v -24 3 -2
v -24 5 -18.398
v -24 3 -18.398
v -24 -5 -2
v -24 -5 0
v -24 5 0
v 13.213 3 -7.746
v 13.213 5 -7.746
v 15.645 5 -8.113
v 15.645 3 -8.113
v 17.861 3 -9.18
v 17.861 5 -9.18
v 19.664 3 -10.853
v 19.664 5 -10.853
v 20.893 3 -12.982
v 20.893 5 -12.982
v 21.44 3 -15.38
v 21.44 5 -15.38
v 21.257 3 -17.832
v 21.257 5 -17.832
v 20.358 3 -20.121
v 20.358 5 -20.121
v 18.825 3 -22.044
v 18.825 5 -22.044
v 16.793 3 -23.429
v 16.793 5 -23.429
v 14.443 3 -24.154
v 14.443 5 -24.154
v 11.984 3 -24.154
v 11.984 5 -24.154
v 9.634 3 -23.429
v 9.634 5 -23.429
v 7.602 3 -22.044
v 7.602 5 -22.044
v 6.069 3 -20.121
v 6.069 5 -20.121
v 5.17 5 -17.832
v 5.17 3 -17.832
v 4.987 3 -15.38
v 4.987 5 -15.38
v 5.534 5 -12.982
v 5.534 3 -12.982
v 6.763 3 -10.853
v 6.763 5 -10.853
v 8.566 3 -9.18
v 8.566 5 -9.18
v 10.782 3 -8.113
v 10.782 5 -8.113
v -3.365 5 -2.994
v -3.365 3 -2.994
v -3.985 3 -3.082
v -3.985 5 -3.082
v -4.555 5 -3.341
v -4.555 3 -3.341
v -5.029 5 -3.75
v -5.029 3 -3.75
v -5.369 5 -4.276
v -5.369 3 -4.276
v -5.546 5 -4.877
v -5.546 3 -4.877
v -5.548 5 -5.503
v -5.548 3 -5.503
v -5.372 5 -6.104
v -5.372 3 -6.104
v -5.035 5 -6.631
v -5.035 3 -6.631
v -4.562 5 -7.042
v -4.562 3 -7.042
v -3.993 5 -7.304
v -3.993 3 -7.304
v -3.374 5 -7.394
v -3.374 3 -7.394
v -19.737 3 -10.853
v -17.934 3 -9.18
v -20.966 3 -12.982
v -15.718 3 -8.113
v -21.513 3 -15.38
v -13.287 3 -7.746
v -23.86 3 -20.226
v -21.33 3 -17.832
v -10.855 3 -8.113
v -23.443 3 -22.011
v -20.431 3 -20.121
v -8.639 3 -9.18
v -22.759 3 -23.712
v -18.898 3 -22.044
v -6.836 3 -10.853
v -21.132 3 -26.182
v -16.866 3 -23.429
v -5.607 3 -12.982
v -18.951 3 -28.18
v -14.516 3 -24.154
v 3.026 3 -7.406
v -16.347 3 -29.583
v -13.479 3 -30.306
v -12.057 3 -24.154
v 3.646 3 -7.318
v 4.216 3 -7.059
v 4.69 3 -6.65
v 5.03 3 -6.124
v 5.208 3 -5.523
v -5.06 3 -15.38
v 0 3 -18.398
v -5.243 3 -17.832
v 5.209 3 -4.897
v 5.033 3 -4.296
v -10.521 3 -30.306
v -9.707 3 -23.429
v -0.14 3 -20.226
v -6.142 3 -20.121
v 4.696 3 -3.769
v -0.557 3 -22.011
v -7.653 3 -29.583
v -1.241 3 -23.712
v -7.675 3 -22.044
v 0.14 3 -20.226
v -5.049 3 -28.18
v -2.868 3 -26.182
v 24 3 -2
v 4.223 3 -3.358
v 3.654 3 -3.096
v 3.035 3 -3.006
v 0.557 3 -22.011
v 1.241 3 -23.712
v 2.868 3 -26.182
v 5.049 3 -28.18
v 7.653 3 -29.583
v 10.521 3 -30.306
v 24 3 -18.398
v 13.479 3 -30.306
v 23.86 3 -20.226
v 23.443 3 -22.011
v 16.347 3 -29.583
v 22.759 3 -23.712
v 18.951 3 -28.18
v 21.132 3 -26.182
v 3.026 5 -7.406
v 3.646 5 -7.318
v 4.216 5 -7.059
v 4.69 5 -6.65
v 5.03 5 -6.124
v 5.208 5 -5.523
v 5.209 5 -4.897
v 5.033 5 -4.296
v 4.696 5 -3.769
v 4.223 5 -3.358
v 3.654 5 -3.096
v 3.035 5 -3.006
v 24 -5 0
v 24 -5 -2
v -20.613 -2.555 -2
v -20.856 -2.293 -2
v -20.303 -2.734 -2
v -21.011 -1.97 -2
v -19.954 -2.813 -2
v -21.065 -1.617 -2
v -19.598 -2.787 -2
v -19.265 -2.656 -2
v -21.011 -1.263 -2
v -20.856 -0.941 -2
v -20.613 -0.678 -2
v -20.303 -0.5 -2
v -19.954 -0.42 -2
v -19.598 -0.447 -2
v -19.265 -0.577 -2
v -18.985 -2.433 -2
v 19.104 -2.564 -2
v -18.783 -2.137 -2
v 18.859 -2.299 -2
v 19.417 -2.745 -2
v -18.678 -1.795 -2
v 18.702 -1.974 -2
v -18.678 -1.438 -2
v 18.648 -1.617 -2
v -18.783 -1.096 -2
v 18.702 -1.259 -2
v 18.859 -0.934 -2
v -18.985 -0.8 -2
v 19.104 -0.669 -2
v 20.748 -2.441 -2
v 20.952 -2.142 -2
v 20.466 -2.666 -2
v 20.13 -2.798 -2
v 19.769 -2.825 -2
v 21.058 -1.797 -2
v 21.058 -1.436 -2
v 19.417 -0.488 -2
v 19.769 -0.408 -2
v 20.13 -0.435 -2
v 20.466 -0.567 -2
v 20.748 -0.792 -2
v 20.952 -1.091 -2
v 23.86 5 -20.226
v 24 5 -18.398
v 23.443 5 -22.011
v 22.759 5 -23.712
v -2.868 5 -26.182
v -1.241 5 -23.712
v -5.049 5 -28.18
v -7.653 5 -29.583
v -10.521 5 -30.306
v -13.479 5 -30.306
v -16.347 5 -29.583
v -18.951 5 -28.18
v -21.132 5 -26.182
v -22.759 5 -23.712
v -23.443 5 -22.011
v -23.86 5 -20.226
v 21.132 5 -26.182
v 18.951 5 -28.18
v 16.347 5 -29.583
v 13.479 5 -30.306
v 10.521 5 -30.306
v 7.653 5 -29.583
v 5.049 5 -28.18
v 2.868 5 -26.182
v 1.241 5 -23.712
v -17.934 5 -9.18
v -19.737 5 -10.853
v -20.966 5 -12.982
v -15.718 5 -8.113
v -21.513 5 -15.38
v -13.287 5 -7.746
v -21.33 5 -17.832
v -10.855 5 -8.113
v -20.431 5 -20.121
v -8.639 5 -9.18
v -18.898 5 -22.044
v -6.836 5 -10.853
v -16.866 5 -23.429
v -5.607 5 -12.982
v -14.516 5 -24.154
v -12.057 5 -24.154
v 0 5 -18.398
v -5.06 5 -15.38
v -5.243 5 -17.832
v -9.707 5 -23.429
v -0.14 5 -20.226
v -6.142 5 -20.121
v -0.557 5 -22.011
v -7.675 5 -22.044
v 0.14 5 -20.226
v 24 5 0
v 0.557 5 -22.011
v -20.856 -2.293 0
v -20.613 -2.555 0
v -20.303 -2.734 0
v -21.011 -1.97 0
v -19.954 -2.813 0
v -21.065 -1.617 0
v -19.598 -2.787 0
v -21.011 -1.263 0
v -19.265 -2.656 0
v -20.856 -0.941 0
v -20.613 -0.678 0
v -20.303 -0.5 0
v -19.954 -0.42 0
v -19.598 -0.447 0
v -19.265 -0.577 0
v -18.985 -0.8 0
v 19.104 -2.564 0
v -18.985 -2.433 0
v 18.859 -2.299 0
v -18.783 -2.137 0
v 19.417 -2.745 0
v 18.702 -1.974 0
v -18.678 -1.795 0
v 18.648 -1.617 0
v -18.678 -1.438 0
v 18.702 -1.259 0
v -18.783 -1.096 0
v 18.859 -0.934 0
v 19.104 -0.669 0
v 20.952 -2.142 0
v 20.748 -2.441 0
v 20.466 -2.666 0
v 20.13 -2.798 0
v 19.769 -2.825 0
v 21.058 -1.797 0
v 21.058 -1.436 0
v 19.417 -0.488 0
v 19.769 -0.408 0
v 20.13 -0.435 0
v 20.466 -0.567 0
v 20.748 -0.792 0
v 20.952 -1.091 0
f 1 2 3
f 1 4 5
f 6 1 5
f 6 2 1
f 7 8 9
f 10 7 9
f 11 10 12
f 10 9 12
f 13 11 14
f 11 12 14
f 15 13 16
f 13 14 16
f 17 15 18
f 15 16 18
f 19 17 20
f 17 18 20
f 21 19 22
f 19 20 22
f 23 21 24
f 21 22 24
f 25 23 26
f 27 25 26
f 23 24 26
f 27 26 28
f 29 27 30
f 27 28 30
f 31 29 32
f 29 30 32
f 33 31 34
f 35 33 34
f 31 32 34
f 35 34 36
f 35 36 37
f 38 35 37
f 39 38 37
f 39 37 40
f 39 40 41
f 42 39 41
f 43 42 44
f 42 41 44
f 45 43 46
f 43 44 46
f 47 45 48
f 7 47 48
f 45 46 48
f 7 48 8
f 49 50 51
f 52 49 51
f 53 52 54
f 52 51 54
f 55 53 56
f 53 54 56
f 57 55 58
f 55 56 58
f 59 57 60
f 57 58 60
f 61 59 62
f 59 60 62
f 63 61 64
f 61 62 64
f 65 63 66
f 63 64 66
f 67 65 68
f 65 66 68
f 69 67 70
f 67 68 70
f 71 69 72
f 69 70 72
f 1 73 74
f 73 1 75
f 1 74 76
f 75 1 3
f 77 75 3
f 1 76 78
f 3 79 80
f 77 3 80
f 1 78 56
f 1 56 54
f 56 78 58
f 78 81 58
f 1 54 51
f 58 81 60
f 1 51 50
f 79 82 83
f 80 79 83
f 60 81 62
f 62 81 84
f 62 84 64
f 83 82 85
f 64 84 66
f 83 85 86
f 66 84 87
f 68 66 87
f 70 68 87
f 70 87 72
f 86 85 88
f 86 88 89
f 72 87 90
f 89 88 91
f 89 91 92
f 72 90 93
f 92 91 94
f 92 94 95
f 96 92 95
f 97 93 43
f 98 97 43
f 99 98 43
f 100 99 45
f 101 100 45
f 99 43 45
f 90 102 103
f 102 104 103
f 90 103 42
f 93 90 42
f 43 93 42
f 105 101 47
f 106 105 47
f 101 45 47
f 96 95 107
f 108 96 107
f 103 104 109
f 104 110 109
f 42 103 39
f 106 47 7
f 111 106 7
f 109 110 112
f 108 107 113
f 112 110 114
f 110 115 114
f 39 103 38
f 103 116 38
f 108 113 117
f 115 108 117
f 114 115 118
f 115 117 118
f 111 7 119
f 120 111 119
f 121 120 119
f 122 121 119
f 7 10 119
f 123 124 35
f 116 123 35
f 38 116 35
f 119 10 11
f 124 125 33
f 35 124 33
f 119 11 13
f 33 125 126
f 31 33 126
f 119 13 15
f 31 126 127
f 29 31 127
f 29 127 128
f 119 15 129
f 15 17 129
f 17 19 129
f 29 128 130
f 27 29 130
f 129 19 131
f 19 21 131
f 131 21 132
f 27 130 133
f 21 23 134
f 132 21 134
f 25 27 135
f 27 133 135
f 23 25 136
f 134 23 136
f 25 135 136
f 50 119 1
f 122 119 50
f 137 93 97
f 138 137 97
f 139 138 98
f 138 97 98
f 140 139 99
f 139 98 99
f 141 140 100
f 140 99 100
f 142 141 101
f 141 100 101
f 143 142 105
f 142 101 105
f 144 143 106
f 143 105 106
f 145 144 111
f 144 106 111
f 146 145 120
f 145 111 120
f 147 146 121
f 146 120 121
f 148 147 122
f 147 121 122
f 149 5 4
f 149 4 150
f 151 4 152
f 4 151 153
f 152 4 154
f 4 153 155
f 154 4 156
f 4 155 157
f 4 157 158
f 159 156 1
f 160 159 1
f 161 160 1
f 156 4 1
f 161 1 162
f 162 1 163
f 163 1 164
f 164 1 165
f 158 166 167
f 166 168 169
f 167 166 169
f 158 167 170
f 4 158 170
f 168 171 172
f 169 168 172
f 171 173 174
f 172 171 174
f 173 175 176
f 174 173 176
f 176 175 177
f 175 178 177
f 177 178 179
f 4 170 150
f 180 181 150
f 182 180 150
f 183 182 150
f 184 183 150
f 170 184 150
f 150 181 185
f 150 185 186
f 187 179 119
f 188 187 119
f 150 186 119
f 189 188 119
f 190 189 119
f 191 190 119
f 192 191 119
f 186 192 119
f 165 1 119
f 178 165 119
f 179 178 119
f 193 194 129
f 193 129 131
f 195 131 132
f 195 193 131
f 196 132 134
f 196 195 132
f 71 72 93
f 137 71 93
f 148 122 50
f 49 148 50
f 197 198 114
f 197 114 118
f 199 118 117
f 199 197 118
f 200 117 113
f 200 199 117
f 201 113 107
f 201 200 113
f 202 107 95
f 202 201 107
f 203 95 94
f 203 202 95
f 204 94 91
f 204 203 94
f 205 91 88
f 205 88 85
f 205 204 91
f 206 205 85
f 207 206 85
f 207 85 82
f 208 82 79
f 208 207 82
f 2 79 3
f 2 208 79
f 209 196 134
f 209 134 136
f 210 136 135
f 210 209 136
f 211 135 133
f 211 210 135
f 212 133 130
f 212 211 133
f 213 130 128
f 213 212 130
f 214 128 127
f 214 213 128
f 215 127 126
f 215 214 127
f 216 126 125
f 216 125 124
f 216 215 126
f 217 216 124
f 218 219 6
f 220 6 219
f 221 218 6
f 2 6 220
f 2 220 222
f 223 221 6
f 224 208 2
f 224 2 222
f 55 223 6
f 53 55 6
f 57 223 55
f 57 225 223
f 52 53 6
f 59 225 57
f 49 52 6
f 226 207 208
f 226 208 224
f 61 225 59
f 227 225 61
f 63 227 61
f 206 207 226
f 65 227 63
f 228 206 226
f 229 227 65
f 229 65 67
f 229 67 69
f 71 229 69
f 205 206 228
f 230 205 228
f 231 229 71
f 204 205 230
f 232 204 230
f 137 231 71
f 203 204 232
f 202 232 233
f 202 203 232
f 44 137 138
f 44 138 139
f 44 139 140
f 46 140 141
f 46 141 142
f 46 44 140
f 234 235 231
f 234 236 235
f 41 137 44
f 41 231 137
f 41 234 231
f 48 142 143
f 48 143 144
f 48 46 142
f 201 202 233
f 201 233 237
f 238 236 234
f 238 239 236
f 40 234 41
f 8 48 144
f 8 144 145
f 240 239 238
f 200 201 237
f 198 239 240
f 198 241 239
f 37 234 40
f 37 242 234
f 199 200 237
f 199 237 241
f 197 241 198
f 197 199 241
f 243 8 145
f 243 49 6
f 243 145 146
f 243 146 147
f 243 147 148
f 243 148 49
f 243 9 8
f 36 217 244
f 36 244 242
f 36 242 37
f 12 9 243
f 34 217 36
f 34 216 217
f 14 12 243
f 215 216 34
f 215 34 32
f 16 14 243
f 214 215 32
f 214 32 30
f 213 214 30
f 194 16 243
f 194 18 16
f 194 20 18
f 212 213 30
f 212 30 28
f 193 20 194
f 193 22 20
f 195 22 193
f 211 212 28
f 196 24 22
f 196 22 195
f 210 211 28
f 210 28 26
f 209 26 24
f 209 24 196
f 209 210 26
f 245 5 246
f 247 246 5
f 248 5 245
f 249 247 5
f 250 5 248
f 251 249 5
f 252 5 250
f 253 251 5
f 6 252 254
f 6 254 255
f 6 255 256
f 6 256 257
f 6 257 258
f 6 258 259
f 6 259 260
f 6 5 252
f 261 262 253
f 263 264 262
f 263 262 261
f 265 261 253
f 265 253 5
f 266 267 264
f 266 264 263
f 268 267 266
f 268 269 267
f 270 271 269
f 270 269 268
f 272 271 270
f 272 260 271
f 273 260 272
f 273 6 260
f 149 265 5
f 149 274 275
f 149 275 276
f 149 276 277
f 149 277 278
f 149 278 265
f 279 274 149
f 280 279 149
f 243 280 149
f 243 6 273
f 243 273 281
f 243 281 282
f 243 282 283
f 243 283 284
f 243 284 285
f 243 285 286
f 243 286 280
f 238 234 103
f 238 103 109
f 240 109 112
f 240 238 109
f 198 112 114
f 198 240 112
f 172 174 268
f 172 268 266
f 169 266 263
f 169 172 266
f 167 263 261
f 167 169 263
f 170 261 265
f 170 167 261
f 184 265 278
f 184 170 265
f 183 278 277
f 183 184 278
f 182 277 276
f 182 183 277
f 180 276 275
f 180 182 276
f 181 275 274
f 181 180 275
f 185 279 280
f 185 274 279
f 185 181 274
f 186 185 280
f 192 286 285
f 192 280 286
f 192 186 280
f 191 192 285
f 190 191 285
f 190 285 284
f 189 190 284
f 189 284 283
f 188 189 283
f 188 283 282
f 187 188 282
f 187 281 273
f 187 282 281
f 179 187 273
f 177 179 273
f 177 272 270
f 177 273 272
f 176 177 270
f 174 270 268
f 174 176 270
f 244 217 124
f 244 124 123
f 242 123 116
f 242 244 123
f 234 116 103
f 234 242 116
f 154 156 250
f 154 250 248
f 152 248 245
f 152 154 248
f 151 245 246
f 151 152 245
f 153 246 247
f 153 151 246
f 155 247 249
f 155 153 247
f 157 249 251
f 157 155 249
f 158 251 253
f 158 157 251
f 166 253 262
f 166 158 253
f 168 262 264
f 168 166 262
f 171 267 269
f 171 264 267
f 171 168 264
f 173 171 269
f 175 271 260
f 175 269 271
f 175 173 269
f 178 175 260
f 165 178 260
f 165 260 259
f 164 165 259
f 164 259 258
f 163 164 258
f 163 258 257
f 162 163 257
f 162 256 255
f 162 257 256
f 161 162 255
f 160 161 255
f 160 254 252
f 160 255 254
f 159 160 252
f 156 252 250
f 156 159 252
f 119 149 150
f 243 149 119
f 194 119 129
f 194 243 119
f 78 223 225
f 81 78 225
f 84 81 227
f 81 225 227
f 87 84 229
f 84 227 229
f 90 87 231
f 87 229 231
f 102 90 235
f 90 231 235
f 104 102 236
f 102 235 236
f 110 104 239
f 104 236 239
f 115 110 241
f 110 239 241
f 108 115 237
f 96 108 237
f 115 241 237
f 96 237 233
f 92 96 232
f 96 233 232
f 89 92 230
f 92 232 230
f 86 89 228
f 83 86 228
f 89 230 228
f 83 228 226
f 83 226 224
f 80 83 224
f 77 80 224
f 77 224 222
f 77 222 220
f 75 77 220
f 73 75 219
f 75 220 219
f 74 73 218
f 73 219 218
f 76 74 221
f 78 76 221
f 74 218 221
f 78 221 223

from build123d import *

# Parameters (mm, degrees)
SKETCH1_W               = 48
SKETCH1_H               = 10
BOSS_EXTRUDE5_DEPTH     = 2
BOSS_EXTRUDE6_START     = 5
BOSS_EXTRUDE6_DEPTH     = 2
SKETCH3_R               = 8.25
CUT_EXTRUDE1_DEPTH      = 2
CUT_EXTRUDE2_DEPTH      = 40.051403925
CUT_EXTRUDE2_DEPTH_BACK = 40.051403925
CUT_EXTRUDE3_DEPTH      = 40.051403925
CUT_EXTRUDE3_DEPTH_BACK = 10
SKETCH6_R               = 1.2
SKETCH6_R_2             = 1.211894006


with BuildPart() as part:
    # Sketch1 → Boss-Extrude5 (new body)
    with BuildSketch(Plane.XY):
        Rectangle(SKETCH1_W, SKETCH1_H)
    extrude(amount=-BOSS_EXTRUDE5_DEPTH)

    # Sketch2 → Boss-Extrude6 (add)
    with BuildSketch(Plane(origin=(0, 0, 0), x_dir=(1, 0, 0), z_dir=(0, 1, 0)).offset(BOSS_EXTRUDE6_START)):
        with BuildLine():
            ThreePointArc((-1.241034606, 23.712139016), (-12, 30.397568135), (-22.758965394, 23.712139016))
            Line((-22.758965394, 23.712139016), (-1.241034606, 23.712139016))
        make_face()
        with BuildLine():
            Line((-1.241034606, 23.712139016), (-22.758965394, 23.712139016))
            ThreePointArc((-22.758965394, 23.712139016), (-23.685623319, 21.126342152), (-24, 18.397568135))
            ThreePointArc((-24, 18.397568135), (-12, 6.397568135), (0, 18.397568135))
            ThreePointArc((0, 18.397568135), (-0.314376681, 21.126342152), (-1.241034606, 23.712139016))
        make_face()
        with BuildLine():
            ThreePointArc((22.758965394, 23.712139016), (12, 30.397568135), (1.241034606, 23.712139016))
            Line((1.241034606, 23.712139016), (22.758965394, 23.712139016))
        make_face()
        with BuildLine():
            Line((22.758965394, 23.712139016), (1.241034606, 23.712139016))
            ThreePointArc((1.241034606, 23.712139016), (0.314376681, 21.126342152), (0, 18.397568135))
            ThreePointArc((0, 18.397568135), (12, 6.397568135), (24, 18.397568135))
            ThreePointArc((24, 18.397568135), (23.685623319, 21.126342152), (22.758965394, 23.712139016))
        make_face()
        with BuildLine():
            ThreePointArc((0, 18.397568135), (-12, 6.397568135), (-24, 18.397568135))
            Line((-24, 18.397568135), (-24, 2))
            Line((-24, 2), (24, 2))
            Line((24, 2), (24, 18.397568135))
            ThreePointArc((24, 18.397568135), (12, 6.397568135), (0, 18.397568135))
        make_face()
    extrude(amount=-BOSS_EXTRUDE6_DEPTH)

    # Sketch3 → Cut-Extrude1 (cut)
    with BuildSketch(Plane(origin=(0, 5, 0), x_dir=(1, 0, 0), z_dir=(0, 1, 0))):
        with Locations(Location((-13.286531406, 15.996474508, 0), (0, 0, 270))):
            Circle(SKETCH3_R)
        with Locations(Location((13.213468594, 15.996474508, 0), (0, 0, 270))):
            Circle(SKETCH3_R)
    extrude(amount=-CUT_EXTRUDE1_DEPTH, mode=Mode.SUBTRACT)

    # Sketch5 → Cut-Extrude2 (cut, two sides: drawn at the far end of the back side and taken through both)
    with BuildSketch(Plane(origin=(0, 0, 0), x_dir=(1, 0, 0), z_dir=(0, 1, 0)).offset(-CUT_EXTRUDE2_DEPTH_BACK)):
        with BuildLine():
            Line((-3.373580641, 7.393929887), (3.026393541, 7.406054321))
            ThreePointArc((3.026393541, 7.406054321), (5.230557377, 5.210226053), (3.034729108, 3.006062217))
            Line((3.034729108, 3.006062217), (-3.365245074, 2.993937783))
            ThreePointArc((-3.365245074, 2.993937783), (-5.56940891, 5.189766052), (-3.373580641, 7.393929887))
        make_face()
    extrude(amount=CUT_EXTRUDE2_DEPTH + CUT_EXTRUDE2_DEPTH_BACK, mode=Mode.SUBTRACT)

    # Sketch6 → Cut-Extrude3 (cut, two sides: drawn at the far end of the back side and taken through both)
    with BuildSketch(Plane.XY.offset(-CUT_EXTRUDE3_DEPTH_BACK)):
        with Locations(Location((-19.864598195, -1.616601086, 0), (0, 0, 180))):
            Circle(SKETCH6_R)
        with Locations(Location((19.86, -1.616601086, 0), (0, 0, 180))):
            Circle(SKETCH6_R_2)
    extrude(amount=CUT_EXTRUDE3_DEPTH + CUT_EXTRUDE3_DEPTH_BACK, mode=Mode.SUBTRACT)


solid = part.part
